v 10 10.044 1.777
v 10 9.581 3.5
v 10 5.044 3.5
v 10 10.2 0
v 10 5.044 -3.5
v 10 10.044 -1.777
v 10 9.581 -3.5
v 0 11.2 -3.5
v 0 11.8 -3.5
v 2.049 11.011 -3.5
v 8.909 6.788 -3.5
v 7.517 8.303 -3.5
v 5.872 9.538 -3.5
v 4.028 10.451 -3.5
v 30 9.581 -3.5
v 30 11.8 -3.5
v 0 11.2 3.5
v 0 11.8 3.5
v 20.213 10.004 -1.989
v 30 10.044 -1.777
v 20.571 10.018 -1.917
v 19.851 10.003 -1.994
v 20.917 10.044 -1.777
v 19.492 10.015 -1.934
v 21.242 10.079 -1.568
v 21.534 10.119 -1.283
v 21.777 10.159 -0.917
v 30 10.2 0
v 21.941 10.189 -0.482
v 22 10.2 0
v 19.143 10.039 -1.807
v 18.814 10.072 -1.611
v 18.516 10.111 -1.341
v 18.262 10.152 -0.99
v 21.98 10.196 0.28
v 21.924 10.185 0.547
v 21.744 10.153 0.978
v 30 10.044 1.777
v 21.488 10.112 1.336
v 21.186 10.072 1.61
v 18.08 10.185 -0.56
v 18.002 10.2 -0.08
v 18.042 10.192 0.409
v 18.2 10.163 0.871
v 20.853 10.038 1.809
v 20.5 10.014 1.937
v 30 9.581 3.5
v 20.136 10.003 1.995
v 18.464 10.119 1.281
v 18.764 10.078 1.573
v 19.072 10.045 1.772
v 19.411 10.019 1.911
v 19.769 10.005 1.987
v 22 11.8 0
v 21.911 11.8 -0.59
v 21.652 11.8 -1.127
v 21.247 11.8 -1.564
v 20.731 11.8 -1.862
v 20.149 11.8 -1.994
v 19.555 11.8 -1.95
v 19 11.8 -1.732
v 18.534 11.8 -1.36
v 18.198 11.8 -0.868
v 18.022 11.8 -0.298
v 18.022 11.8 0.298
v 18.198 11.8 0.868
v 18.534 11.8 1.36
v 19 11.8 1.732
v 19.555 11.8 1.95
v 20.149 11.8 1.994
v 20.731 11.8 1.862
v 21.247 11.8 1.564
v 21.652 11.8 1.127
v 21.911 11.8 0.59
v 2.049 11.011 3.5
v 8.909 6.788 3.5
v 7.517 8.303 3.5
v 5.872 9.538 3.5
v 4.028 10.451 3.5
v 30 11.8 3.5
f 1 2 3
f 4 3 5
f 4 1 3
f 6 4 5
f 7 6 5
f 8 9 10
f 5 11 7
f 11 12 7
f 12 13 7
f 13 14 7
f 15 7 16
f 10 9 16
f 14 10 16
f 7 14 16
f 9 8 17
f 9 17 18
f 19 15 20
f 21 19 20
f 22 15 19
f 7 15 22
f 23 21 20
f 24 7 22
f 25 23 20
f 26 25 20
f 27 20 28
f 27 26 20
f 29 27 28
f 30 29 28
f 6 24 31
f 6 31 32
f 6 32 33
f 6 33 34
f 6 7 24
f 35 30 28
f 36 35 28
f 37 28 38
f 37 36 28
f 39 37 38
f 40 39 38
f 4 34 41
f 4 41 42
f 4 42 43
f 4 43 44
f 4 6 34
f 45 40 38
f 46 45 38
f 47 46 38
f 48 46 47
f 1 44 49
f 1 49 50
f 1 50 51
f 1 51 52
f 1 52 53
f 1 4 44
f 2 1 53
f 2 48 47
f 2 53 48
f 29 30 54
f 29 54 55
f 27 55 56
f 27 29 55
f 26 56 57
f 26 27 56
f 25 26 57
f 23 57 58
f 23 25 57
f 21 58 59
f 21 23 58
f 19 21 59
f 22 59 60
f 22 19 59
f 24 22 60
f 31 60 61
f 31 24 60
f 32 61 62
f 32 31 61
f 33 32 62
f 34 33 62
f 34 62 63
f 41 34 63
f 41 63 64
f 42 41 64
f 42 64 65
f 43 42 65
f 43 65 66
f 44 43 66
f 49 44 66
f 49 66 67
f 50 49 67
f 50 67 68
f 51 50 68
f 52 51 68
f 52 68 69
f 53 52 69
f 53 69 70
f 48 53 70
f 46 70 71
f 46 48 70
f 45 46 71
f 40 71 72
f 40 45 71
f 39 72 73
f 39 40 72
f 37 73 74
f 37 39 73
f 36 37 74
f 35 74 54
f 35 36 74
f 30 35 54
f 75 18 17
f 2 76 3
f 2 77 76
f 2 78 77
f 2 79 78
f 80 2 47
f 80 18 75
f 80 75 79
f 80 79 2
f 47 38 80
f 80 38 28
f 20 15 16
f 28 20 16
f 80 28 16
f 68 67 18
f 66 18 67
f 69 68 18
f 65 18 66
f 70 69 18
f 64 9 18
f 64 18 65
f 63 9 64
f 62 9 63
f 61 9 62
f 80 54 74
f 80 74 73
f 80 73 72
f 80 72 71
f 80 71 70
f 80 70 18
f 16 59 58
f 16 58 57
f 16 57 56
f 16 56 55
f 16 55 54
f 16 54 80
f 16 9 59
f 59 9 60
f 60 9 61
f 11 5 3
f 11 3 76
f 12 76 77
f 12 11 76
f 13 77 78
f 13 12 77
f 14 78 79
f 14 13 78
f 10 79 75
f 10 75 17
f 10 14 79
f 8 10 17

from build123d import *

# Parameters (mm, degrees)
CYLINDER001_R          = 11.2
CYLINDER001_DEPTH      = 7
CYLINDER002_R          = 2
CYLINDER002_DEPTH      = 10
CYLINDER002_ROLL_ANGLE = -90
CYLINDER_R             = 10.2
CYLINDER_DEPTH         = 20
CYLINDER_PITCH_ANGLE   = 90
BOX_W                  = 30
BOX_H                  = 11.8
BOX_DEPTH              = 7


with BuildPart() as cylinder001:
    # Cylinder001 → Cylinder001 (new body)
    with BuildSketch(Plane.XY.offset(-3.5)):
        Circle(CYLINDER001_R)
    extrude(amount=CYLINDER001_DEPTH)


with BuildPart() as cylinder002:
    # Cylinder002 → Cylinder002 (new body)
    with BuildSketch(Plane.XY):
        Circle(CYLINDER002_R)
    extrude(amount=CYLINDER002_DEPTH)


with BuildPart() as cylinder002_1:
    # Cylinder002 roll: moved
    add(cylinder002.part.rotate(Axis((0, 0, 0), (1, 0, 0)), CYLINDER002_ROLL_ANGLE))


with BuildPart() as cylinder002_2:
    # Cylinder002 placement: moved
    add(cylinder002_1.part.moved(Location((20, 5, 0))))


with BuildPart() as fusion:
    # Cylinder → Cylinder (new body)
    with BuildSketch(Plane.XY):
        Circle(CYLINDER_R)
    extrude(amount=CYLINDER_DEPTH)


with BuildPart() as fusion_1:
    # Cylinder pitch: moved
    add(fusion.part.rotate(Axis((0, 0, 0), (0, 1, 0)), CYLINDER_PITCH_ANGLE))


with BuildPart() as fusion_2:
    # Cylinder placement: moved
    add(fusion_1.part.moved(Location((10, 0, 0))))

    # Fusion: union Cylinder001, Cylinder002
    add(cylinder001.part)
    add(cylinder002_2.part)


with BuildPart() as cut:
    # Box → Box (new body)
    with BuildSketch(Plane.XY.offset(-3.5)):
        with Locations((15, 5.9)):
            Rectangle(BOX_W, BOX_H)
    extrude(amount=BOX_DEPTH)

    # Cut: cut Fusion
    add(fusion_2.part, mode=Mode.SUBTRACT)


solid = cut.part
